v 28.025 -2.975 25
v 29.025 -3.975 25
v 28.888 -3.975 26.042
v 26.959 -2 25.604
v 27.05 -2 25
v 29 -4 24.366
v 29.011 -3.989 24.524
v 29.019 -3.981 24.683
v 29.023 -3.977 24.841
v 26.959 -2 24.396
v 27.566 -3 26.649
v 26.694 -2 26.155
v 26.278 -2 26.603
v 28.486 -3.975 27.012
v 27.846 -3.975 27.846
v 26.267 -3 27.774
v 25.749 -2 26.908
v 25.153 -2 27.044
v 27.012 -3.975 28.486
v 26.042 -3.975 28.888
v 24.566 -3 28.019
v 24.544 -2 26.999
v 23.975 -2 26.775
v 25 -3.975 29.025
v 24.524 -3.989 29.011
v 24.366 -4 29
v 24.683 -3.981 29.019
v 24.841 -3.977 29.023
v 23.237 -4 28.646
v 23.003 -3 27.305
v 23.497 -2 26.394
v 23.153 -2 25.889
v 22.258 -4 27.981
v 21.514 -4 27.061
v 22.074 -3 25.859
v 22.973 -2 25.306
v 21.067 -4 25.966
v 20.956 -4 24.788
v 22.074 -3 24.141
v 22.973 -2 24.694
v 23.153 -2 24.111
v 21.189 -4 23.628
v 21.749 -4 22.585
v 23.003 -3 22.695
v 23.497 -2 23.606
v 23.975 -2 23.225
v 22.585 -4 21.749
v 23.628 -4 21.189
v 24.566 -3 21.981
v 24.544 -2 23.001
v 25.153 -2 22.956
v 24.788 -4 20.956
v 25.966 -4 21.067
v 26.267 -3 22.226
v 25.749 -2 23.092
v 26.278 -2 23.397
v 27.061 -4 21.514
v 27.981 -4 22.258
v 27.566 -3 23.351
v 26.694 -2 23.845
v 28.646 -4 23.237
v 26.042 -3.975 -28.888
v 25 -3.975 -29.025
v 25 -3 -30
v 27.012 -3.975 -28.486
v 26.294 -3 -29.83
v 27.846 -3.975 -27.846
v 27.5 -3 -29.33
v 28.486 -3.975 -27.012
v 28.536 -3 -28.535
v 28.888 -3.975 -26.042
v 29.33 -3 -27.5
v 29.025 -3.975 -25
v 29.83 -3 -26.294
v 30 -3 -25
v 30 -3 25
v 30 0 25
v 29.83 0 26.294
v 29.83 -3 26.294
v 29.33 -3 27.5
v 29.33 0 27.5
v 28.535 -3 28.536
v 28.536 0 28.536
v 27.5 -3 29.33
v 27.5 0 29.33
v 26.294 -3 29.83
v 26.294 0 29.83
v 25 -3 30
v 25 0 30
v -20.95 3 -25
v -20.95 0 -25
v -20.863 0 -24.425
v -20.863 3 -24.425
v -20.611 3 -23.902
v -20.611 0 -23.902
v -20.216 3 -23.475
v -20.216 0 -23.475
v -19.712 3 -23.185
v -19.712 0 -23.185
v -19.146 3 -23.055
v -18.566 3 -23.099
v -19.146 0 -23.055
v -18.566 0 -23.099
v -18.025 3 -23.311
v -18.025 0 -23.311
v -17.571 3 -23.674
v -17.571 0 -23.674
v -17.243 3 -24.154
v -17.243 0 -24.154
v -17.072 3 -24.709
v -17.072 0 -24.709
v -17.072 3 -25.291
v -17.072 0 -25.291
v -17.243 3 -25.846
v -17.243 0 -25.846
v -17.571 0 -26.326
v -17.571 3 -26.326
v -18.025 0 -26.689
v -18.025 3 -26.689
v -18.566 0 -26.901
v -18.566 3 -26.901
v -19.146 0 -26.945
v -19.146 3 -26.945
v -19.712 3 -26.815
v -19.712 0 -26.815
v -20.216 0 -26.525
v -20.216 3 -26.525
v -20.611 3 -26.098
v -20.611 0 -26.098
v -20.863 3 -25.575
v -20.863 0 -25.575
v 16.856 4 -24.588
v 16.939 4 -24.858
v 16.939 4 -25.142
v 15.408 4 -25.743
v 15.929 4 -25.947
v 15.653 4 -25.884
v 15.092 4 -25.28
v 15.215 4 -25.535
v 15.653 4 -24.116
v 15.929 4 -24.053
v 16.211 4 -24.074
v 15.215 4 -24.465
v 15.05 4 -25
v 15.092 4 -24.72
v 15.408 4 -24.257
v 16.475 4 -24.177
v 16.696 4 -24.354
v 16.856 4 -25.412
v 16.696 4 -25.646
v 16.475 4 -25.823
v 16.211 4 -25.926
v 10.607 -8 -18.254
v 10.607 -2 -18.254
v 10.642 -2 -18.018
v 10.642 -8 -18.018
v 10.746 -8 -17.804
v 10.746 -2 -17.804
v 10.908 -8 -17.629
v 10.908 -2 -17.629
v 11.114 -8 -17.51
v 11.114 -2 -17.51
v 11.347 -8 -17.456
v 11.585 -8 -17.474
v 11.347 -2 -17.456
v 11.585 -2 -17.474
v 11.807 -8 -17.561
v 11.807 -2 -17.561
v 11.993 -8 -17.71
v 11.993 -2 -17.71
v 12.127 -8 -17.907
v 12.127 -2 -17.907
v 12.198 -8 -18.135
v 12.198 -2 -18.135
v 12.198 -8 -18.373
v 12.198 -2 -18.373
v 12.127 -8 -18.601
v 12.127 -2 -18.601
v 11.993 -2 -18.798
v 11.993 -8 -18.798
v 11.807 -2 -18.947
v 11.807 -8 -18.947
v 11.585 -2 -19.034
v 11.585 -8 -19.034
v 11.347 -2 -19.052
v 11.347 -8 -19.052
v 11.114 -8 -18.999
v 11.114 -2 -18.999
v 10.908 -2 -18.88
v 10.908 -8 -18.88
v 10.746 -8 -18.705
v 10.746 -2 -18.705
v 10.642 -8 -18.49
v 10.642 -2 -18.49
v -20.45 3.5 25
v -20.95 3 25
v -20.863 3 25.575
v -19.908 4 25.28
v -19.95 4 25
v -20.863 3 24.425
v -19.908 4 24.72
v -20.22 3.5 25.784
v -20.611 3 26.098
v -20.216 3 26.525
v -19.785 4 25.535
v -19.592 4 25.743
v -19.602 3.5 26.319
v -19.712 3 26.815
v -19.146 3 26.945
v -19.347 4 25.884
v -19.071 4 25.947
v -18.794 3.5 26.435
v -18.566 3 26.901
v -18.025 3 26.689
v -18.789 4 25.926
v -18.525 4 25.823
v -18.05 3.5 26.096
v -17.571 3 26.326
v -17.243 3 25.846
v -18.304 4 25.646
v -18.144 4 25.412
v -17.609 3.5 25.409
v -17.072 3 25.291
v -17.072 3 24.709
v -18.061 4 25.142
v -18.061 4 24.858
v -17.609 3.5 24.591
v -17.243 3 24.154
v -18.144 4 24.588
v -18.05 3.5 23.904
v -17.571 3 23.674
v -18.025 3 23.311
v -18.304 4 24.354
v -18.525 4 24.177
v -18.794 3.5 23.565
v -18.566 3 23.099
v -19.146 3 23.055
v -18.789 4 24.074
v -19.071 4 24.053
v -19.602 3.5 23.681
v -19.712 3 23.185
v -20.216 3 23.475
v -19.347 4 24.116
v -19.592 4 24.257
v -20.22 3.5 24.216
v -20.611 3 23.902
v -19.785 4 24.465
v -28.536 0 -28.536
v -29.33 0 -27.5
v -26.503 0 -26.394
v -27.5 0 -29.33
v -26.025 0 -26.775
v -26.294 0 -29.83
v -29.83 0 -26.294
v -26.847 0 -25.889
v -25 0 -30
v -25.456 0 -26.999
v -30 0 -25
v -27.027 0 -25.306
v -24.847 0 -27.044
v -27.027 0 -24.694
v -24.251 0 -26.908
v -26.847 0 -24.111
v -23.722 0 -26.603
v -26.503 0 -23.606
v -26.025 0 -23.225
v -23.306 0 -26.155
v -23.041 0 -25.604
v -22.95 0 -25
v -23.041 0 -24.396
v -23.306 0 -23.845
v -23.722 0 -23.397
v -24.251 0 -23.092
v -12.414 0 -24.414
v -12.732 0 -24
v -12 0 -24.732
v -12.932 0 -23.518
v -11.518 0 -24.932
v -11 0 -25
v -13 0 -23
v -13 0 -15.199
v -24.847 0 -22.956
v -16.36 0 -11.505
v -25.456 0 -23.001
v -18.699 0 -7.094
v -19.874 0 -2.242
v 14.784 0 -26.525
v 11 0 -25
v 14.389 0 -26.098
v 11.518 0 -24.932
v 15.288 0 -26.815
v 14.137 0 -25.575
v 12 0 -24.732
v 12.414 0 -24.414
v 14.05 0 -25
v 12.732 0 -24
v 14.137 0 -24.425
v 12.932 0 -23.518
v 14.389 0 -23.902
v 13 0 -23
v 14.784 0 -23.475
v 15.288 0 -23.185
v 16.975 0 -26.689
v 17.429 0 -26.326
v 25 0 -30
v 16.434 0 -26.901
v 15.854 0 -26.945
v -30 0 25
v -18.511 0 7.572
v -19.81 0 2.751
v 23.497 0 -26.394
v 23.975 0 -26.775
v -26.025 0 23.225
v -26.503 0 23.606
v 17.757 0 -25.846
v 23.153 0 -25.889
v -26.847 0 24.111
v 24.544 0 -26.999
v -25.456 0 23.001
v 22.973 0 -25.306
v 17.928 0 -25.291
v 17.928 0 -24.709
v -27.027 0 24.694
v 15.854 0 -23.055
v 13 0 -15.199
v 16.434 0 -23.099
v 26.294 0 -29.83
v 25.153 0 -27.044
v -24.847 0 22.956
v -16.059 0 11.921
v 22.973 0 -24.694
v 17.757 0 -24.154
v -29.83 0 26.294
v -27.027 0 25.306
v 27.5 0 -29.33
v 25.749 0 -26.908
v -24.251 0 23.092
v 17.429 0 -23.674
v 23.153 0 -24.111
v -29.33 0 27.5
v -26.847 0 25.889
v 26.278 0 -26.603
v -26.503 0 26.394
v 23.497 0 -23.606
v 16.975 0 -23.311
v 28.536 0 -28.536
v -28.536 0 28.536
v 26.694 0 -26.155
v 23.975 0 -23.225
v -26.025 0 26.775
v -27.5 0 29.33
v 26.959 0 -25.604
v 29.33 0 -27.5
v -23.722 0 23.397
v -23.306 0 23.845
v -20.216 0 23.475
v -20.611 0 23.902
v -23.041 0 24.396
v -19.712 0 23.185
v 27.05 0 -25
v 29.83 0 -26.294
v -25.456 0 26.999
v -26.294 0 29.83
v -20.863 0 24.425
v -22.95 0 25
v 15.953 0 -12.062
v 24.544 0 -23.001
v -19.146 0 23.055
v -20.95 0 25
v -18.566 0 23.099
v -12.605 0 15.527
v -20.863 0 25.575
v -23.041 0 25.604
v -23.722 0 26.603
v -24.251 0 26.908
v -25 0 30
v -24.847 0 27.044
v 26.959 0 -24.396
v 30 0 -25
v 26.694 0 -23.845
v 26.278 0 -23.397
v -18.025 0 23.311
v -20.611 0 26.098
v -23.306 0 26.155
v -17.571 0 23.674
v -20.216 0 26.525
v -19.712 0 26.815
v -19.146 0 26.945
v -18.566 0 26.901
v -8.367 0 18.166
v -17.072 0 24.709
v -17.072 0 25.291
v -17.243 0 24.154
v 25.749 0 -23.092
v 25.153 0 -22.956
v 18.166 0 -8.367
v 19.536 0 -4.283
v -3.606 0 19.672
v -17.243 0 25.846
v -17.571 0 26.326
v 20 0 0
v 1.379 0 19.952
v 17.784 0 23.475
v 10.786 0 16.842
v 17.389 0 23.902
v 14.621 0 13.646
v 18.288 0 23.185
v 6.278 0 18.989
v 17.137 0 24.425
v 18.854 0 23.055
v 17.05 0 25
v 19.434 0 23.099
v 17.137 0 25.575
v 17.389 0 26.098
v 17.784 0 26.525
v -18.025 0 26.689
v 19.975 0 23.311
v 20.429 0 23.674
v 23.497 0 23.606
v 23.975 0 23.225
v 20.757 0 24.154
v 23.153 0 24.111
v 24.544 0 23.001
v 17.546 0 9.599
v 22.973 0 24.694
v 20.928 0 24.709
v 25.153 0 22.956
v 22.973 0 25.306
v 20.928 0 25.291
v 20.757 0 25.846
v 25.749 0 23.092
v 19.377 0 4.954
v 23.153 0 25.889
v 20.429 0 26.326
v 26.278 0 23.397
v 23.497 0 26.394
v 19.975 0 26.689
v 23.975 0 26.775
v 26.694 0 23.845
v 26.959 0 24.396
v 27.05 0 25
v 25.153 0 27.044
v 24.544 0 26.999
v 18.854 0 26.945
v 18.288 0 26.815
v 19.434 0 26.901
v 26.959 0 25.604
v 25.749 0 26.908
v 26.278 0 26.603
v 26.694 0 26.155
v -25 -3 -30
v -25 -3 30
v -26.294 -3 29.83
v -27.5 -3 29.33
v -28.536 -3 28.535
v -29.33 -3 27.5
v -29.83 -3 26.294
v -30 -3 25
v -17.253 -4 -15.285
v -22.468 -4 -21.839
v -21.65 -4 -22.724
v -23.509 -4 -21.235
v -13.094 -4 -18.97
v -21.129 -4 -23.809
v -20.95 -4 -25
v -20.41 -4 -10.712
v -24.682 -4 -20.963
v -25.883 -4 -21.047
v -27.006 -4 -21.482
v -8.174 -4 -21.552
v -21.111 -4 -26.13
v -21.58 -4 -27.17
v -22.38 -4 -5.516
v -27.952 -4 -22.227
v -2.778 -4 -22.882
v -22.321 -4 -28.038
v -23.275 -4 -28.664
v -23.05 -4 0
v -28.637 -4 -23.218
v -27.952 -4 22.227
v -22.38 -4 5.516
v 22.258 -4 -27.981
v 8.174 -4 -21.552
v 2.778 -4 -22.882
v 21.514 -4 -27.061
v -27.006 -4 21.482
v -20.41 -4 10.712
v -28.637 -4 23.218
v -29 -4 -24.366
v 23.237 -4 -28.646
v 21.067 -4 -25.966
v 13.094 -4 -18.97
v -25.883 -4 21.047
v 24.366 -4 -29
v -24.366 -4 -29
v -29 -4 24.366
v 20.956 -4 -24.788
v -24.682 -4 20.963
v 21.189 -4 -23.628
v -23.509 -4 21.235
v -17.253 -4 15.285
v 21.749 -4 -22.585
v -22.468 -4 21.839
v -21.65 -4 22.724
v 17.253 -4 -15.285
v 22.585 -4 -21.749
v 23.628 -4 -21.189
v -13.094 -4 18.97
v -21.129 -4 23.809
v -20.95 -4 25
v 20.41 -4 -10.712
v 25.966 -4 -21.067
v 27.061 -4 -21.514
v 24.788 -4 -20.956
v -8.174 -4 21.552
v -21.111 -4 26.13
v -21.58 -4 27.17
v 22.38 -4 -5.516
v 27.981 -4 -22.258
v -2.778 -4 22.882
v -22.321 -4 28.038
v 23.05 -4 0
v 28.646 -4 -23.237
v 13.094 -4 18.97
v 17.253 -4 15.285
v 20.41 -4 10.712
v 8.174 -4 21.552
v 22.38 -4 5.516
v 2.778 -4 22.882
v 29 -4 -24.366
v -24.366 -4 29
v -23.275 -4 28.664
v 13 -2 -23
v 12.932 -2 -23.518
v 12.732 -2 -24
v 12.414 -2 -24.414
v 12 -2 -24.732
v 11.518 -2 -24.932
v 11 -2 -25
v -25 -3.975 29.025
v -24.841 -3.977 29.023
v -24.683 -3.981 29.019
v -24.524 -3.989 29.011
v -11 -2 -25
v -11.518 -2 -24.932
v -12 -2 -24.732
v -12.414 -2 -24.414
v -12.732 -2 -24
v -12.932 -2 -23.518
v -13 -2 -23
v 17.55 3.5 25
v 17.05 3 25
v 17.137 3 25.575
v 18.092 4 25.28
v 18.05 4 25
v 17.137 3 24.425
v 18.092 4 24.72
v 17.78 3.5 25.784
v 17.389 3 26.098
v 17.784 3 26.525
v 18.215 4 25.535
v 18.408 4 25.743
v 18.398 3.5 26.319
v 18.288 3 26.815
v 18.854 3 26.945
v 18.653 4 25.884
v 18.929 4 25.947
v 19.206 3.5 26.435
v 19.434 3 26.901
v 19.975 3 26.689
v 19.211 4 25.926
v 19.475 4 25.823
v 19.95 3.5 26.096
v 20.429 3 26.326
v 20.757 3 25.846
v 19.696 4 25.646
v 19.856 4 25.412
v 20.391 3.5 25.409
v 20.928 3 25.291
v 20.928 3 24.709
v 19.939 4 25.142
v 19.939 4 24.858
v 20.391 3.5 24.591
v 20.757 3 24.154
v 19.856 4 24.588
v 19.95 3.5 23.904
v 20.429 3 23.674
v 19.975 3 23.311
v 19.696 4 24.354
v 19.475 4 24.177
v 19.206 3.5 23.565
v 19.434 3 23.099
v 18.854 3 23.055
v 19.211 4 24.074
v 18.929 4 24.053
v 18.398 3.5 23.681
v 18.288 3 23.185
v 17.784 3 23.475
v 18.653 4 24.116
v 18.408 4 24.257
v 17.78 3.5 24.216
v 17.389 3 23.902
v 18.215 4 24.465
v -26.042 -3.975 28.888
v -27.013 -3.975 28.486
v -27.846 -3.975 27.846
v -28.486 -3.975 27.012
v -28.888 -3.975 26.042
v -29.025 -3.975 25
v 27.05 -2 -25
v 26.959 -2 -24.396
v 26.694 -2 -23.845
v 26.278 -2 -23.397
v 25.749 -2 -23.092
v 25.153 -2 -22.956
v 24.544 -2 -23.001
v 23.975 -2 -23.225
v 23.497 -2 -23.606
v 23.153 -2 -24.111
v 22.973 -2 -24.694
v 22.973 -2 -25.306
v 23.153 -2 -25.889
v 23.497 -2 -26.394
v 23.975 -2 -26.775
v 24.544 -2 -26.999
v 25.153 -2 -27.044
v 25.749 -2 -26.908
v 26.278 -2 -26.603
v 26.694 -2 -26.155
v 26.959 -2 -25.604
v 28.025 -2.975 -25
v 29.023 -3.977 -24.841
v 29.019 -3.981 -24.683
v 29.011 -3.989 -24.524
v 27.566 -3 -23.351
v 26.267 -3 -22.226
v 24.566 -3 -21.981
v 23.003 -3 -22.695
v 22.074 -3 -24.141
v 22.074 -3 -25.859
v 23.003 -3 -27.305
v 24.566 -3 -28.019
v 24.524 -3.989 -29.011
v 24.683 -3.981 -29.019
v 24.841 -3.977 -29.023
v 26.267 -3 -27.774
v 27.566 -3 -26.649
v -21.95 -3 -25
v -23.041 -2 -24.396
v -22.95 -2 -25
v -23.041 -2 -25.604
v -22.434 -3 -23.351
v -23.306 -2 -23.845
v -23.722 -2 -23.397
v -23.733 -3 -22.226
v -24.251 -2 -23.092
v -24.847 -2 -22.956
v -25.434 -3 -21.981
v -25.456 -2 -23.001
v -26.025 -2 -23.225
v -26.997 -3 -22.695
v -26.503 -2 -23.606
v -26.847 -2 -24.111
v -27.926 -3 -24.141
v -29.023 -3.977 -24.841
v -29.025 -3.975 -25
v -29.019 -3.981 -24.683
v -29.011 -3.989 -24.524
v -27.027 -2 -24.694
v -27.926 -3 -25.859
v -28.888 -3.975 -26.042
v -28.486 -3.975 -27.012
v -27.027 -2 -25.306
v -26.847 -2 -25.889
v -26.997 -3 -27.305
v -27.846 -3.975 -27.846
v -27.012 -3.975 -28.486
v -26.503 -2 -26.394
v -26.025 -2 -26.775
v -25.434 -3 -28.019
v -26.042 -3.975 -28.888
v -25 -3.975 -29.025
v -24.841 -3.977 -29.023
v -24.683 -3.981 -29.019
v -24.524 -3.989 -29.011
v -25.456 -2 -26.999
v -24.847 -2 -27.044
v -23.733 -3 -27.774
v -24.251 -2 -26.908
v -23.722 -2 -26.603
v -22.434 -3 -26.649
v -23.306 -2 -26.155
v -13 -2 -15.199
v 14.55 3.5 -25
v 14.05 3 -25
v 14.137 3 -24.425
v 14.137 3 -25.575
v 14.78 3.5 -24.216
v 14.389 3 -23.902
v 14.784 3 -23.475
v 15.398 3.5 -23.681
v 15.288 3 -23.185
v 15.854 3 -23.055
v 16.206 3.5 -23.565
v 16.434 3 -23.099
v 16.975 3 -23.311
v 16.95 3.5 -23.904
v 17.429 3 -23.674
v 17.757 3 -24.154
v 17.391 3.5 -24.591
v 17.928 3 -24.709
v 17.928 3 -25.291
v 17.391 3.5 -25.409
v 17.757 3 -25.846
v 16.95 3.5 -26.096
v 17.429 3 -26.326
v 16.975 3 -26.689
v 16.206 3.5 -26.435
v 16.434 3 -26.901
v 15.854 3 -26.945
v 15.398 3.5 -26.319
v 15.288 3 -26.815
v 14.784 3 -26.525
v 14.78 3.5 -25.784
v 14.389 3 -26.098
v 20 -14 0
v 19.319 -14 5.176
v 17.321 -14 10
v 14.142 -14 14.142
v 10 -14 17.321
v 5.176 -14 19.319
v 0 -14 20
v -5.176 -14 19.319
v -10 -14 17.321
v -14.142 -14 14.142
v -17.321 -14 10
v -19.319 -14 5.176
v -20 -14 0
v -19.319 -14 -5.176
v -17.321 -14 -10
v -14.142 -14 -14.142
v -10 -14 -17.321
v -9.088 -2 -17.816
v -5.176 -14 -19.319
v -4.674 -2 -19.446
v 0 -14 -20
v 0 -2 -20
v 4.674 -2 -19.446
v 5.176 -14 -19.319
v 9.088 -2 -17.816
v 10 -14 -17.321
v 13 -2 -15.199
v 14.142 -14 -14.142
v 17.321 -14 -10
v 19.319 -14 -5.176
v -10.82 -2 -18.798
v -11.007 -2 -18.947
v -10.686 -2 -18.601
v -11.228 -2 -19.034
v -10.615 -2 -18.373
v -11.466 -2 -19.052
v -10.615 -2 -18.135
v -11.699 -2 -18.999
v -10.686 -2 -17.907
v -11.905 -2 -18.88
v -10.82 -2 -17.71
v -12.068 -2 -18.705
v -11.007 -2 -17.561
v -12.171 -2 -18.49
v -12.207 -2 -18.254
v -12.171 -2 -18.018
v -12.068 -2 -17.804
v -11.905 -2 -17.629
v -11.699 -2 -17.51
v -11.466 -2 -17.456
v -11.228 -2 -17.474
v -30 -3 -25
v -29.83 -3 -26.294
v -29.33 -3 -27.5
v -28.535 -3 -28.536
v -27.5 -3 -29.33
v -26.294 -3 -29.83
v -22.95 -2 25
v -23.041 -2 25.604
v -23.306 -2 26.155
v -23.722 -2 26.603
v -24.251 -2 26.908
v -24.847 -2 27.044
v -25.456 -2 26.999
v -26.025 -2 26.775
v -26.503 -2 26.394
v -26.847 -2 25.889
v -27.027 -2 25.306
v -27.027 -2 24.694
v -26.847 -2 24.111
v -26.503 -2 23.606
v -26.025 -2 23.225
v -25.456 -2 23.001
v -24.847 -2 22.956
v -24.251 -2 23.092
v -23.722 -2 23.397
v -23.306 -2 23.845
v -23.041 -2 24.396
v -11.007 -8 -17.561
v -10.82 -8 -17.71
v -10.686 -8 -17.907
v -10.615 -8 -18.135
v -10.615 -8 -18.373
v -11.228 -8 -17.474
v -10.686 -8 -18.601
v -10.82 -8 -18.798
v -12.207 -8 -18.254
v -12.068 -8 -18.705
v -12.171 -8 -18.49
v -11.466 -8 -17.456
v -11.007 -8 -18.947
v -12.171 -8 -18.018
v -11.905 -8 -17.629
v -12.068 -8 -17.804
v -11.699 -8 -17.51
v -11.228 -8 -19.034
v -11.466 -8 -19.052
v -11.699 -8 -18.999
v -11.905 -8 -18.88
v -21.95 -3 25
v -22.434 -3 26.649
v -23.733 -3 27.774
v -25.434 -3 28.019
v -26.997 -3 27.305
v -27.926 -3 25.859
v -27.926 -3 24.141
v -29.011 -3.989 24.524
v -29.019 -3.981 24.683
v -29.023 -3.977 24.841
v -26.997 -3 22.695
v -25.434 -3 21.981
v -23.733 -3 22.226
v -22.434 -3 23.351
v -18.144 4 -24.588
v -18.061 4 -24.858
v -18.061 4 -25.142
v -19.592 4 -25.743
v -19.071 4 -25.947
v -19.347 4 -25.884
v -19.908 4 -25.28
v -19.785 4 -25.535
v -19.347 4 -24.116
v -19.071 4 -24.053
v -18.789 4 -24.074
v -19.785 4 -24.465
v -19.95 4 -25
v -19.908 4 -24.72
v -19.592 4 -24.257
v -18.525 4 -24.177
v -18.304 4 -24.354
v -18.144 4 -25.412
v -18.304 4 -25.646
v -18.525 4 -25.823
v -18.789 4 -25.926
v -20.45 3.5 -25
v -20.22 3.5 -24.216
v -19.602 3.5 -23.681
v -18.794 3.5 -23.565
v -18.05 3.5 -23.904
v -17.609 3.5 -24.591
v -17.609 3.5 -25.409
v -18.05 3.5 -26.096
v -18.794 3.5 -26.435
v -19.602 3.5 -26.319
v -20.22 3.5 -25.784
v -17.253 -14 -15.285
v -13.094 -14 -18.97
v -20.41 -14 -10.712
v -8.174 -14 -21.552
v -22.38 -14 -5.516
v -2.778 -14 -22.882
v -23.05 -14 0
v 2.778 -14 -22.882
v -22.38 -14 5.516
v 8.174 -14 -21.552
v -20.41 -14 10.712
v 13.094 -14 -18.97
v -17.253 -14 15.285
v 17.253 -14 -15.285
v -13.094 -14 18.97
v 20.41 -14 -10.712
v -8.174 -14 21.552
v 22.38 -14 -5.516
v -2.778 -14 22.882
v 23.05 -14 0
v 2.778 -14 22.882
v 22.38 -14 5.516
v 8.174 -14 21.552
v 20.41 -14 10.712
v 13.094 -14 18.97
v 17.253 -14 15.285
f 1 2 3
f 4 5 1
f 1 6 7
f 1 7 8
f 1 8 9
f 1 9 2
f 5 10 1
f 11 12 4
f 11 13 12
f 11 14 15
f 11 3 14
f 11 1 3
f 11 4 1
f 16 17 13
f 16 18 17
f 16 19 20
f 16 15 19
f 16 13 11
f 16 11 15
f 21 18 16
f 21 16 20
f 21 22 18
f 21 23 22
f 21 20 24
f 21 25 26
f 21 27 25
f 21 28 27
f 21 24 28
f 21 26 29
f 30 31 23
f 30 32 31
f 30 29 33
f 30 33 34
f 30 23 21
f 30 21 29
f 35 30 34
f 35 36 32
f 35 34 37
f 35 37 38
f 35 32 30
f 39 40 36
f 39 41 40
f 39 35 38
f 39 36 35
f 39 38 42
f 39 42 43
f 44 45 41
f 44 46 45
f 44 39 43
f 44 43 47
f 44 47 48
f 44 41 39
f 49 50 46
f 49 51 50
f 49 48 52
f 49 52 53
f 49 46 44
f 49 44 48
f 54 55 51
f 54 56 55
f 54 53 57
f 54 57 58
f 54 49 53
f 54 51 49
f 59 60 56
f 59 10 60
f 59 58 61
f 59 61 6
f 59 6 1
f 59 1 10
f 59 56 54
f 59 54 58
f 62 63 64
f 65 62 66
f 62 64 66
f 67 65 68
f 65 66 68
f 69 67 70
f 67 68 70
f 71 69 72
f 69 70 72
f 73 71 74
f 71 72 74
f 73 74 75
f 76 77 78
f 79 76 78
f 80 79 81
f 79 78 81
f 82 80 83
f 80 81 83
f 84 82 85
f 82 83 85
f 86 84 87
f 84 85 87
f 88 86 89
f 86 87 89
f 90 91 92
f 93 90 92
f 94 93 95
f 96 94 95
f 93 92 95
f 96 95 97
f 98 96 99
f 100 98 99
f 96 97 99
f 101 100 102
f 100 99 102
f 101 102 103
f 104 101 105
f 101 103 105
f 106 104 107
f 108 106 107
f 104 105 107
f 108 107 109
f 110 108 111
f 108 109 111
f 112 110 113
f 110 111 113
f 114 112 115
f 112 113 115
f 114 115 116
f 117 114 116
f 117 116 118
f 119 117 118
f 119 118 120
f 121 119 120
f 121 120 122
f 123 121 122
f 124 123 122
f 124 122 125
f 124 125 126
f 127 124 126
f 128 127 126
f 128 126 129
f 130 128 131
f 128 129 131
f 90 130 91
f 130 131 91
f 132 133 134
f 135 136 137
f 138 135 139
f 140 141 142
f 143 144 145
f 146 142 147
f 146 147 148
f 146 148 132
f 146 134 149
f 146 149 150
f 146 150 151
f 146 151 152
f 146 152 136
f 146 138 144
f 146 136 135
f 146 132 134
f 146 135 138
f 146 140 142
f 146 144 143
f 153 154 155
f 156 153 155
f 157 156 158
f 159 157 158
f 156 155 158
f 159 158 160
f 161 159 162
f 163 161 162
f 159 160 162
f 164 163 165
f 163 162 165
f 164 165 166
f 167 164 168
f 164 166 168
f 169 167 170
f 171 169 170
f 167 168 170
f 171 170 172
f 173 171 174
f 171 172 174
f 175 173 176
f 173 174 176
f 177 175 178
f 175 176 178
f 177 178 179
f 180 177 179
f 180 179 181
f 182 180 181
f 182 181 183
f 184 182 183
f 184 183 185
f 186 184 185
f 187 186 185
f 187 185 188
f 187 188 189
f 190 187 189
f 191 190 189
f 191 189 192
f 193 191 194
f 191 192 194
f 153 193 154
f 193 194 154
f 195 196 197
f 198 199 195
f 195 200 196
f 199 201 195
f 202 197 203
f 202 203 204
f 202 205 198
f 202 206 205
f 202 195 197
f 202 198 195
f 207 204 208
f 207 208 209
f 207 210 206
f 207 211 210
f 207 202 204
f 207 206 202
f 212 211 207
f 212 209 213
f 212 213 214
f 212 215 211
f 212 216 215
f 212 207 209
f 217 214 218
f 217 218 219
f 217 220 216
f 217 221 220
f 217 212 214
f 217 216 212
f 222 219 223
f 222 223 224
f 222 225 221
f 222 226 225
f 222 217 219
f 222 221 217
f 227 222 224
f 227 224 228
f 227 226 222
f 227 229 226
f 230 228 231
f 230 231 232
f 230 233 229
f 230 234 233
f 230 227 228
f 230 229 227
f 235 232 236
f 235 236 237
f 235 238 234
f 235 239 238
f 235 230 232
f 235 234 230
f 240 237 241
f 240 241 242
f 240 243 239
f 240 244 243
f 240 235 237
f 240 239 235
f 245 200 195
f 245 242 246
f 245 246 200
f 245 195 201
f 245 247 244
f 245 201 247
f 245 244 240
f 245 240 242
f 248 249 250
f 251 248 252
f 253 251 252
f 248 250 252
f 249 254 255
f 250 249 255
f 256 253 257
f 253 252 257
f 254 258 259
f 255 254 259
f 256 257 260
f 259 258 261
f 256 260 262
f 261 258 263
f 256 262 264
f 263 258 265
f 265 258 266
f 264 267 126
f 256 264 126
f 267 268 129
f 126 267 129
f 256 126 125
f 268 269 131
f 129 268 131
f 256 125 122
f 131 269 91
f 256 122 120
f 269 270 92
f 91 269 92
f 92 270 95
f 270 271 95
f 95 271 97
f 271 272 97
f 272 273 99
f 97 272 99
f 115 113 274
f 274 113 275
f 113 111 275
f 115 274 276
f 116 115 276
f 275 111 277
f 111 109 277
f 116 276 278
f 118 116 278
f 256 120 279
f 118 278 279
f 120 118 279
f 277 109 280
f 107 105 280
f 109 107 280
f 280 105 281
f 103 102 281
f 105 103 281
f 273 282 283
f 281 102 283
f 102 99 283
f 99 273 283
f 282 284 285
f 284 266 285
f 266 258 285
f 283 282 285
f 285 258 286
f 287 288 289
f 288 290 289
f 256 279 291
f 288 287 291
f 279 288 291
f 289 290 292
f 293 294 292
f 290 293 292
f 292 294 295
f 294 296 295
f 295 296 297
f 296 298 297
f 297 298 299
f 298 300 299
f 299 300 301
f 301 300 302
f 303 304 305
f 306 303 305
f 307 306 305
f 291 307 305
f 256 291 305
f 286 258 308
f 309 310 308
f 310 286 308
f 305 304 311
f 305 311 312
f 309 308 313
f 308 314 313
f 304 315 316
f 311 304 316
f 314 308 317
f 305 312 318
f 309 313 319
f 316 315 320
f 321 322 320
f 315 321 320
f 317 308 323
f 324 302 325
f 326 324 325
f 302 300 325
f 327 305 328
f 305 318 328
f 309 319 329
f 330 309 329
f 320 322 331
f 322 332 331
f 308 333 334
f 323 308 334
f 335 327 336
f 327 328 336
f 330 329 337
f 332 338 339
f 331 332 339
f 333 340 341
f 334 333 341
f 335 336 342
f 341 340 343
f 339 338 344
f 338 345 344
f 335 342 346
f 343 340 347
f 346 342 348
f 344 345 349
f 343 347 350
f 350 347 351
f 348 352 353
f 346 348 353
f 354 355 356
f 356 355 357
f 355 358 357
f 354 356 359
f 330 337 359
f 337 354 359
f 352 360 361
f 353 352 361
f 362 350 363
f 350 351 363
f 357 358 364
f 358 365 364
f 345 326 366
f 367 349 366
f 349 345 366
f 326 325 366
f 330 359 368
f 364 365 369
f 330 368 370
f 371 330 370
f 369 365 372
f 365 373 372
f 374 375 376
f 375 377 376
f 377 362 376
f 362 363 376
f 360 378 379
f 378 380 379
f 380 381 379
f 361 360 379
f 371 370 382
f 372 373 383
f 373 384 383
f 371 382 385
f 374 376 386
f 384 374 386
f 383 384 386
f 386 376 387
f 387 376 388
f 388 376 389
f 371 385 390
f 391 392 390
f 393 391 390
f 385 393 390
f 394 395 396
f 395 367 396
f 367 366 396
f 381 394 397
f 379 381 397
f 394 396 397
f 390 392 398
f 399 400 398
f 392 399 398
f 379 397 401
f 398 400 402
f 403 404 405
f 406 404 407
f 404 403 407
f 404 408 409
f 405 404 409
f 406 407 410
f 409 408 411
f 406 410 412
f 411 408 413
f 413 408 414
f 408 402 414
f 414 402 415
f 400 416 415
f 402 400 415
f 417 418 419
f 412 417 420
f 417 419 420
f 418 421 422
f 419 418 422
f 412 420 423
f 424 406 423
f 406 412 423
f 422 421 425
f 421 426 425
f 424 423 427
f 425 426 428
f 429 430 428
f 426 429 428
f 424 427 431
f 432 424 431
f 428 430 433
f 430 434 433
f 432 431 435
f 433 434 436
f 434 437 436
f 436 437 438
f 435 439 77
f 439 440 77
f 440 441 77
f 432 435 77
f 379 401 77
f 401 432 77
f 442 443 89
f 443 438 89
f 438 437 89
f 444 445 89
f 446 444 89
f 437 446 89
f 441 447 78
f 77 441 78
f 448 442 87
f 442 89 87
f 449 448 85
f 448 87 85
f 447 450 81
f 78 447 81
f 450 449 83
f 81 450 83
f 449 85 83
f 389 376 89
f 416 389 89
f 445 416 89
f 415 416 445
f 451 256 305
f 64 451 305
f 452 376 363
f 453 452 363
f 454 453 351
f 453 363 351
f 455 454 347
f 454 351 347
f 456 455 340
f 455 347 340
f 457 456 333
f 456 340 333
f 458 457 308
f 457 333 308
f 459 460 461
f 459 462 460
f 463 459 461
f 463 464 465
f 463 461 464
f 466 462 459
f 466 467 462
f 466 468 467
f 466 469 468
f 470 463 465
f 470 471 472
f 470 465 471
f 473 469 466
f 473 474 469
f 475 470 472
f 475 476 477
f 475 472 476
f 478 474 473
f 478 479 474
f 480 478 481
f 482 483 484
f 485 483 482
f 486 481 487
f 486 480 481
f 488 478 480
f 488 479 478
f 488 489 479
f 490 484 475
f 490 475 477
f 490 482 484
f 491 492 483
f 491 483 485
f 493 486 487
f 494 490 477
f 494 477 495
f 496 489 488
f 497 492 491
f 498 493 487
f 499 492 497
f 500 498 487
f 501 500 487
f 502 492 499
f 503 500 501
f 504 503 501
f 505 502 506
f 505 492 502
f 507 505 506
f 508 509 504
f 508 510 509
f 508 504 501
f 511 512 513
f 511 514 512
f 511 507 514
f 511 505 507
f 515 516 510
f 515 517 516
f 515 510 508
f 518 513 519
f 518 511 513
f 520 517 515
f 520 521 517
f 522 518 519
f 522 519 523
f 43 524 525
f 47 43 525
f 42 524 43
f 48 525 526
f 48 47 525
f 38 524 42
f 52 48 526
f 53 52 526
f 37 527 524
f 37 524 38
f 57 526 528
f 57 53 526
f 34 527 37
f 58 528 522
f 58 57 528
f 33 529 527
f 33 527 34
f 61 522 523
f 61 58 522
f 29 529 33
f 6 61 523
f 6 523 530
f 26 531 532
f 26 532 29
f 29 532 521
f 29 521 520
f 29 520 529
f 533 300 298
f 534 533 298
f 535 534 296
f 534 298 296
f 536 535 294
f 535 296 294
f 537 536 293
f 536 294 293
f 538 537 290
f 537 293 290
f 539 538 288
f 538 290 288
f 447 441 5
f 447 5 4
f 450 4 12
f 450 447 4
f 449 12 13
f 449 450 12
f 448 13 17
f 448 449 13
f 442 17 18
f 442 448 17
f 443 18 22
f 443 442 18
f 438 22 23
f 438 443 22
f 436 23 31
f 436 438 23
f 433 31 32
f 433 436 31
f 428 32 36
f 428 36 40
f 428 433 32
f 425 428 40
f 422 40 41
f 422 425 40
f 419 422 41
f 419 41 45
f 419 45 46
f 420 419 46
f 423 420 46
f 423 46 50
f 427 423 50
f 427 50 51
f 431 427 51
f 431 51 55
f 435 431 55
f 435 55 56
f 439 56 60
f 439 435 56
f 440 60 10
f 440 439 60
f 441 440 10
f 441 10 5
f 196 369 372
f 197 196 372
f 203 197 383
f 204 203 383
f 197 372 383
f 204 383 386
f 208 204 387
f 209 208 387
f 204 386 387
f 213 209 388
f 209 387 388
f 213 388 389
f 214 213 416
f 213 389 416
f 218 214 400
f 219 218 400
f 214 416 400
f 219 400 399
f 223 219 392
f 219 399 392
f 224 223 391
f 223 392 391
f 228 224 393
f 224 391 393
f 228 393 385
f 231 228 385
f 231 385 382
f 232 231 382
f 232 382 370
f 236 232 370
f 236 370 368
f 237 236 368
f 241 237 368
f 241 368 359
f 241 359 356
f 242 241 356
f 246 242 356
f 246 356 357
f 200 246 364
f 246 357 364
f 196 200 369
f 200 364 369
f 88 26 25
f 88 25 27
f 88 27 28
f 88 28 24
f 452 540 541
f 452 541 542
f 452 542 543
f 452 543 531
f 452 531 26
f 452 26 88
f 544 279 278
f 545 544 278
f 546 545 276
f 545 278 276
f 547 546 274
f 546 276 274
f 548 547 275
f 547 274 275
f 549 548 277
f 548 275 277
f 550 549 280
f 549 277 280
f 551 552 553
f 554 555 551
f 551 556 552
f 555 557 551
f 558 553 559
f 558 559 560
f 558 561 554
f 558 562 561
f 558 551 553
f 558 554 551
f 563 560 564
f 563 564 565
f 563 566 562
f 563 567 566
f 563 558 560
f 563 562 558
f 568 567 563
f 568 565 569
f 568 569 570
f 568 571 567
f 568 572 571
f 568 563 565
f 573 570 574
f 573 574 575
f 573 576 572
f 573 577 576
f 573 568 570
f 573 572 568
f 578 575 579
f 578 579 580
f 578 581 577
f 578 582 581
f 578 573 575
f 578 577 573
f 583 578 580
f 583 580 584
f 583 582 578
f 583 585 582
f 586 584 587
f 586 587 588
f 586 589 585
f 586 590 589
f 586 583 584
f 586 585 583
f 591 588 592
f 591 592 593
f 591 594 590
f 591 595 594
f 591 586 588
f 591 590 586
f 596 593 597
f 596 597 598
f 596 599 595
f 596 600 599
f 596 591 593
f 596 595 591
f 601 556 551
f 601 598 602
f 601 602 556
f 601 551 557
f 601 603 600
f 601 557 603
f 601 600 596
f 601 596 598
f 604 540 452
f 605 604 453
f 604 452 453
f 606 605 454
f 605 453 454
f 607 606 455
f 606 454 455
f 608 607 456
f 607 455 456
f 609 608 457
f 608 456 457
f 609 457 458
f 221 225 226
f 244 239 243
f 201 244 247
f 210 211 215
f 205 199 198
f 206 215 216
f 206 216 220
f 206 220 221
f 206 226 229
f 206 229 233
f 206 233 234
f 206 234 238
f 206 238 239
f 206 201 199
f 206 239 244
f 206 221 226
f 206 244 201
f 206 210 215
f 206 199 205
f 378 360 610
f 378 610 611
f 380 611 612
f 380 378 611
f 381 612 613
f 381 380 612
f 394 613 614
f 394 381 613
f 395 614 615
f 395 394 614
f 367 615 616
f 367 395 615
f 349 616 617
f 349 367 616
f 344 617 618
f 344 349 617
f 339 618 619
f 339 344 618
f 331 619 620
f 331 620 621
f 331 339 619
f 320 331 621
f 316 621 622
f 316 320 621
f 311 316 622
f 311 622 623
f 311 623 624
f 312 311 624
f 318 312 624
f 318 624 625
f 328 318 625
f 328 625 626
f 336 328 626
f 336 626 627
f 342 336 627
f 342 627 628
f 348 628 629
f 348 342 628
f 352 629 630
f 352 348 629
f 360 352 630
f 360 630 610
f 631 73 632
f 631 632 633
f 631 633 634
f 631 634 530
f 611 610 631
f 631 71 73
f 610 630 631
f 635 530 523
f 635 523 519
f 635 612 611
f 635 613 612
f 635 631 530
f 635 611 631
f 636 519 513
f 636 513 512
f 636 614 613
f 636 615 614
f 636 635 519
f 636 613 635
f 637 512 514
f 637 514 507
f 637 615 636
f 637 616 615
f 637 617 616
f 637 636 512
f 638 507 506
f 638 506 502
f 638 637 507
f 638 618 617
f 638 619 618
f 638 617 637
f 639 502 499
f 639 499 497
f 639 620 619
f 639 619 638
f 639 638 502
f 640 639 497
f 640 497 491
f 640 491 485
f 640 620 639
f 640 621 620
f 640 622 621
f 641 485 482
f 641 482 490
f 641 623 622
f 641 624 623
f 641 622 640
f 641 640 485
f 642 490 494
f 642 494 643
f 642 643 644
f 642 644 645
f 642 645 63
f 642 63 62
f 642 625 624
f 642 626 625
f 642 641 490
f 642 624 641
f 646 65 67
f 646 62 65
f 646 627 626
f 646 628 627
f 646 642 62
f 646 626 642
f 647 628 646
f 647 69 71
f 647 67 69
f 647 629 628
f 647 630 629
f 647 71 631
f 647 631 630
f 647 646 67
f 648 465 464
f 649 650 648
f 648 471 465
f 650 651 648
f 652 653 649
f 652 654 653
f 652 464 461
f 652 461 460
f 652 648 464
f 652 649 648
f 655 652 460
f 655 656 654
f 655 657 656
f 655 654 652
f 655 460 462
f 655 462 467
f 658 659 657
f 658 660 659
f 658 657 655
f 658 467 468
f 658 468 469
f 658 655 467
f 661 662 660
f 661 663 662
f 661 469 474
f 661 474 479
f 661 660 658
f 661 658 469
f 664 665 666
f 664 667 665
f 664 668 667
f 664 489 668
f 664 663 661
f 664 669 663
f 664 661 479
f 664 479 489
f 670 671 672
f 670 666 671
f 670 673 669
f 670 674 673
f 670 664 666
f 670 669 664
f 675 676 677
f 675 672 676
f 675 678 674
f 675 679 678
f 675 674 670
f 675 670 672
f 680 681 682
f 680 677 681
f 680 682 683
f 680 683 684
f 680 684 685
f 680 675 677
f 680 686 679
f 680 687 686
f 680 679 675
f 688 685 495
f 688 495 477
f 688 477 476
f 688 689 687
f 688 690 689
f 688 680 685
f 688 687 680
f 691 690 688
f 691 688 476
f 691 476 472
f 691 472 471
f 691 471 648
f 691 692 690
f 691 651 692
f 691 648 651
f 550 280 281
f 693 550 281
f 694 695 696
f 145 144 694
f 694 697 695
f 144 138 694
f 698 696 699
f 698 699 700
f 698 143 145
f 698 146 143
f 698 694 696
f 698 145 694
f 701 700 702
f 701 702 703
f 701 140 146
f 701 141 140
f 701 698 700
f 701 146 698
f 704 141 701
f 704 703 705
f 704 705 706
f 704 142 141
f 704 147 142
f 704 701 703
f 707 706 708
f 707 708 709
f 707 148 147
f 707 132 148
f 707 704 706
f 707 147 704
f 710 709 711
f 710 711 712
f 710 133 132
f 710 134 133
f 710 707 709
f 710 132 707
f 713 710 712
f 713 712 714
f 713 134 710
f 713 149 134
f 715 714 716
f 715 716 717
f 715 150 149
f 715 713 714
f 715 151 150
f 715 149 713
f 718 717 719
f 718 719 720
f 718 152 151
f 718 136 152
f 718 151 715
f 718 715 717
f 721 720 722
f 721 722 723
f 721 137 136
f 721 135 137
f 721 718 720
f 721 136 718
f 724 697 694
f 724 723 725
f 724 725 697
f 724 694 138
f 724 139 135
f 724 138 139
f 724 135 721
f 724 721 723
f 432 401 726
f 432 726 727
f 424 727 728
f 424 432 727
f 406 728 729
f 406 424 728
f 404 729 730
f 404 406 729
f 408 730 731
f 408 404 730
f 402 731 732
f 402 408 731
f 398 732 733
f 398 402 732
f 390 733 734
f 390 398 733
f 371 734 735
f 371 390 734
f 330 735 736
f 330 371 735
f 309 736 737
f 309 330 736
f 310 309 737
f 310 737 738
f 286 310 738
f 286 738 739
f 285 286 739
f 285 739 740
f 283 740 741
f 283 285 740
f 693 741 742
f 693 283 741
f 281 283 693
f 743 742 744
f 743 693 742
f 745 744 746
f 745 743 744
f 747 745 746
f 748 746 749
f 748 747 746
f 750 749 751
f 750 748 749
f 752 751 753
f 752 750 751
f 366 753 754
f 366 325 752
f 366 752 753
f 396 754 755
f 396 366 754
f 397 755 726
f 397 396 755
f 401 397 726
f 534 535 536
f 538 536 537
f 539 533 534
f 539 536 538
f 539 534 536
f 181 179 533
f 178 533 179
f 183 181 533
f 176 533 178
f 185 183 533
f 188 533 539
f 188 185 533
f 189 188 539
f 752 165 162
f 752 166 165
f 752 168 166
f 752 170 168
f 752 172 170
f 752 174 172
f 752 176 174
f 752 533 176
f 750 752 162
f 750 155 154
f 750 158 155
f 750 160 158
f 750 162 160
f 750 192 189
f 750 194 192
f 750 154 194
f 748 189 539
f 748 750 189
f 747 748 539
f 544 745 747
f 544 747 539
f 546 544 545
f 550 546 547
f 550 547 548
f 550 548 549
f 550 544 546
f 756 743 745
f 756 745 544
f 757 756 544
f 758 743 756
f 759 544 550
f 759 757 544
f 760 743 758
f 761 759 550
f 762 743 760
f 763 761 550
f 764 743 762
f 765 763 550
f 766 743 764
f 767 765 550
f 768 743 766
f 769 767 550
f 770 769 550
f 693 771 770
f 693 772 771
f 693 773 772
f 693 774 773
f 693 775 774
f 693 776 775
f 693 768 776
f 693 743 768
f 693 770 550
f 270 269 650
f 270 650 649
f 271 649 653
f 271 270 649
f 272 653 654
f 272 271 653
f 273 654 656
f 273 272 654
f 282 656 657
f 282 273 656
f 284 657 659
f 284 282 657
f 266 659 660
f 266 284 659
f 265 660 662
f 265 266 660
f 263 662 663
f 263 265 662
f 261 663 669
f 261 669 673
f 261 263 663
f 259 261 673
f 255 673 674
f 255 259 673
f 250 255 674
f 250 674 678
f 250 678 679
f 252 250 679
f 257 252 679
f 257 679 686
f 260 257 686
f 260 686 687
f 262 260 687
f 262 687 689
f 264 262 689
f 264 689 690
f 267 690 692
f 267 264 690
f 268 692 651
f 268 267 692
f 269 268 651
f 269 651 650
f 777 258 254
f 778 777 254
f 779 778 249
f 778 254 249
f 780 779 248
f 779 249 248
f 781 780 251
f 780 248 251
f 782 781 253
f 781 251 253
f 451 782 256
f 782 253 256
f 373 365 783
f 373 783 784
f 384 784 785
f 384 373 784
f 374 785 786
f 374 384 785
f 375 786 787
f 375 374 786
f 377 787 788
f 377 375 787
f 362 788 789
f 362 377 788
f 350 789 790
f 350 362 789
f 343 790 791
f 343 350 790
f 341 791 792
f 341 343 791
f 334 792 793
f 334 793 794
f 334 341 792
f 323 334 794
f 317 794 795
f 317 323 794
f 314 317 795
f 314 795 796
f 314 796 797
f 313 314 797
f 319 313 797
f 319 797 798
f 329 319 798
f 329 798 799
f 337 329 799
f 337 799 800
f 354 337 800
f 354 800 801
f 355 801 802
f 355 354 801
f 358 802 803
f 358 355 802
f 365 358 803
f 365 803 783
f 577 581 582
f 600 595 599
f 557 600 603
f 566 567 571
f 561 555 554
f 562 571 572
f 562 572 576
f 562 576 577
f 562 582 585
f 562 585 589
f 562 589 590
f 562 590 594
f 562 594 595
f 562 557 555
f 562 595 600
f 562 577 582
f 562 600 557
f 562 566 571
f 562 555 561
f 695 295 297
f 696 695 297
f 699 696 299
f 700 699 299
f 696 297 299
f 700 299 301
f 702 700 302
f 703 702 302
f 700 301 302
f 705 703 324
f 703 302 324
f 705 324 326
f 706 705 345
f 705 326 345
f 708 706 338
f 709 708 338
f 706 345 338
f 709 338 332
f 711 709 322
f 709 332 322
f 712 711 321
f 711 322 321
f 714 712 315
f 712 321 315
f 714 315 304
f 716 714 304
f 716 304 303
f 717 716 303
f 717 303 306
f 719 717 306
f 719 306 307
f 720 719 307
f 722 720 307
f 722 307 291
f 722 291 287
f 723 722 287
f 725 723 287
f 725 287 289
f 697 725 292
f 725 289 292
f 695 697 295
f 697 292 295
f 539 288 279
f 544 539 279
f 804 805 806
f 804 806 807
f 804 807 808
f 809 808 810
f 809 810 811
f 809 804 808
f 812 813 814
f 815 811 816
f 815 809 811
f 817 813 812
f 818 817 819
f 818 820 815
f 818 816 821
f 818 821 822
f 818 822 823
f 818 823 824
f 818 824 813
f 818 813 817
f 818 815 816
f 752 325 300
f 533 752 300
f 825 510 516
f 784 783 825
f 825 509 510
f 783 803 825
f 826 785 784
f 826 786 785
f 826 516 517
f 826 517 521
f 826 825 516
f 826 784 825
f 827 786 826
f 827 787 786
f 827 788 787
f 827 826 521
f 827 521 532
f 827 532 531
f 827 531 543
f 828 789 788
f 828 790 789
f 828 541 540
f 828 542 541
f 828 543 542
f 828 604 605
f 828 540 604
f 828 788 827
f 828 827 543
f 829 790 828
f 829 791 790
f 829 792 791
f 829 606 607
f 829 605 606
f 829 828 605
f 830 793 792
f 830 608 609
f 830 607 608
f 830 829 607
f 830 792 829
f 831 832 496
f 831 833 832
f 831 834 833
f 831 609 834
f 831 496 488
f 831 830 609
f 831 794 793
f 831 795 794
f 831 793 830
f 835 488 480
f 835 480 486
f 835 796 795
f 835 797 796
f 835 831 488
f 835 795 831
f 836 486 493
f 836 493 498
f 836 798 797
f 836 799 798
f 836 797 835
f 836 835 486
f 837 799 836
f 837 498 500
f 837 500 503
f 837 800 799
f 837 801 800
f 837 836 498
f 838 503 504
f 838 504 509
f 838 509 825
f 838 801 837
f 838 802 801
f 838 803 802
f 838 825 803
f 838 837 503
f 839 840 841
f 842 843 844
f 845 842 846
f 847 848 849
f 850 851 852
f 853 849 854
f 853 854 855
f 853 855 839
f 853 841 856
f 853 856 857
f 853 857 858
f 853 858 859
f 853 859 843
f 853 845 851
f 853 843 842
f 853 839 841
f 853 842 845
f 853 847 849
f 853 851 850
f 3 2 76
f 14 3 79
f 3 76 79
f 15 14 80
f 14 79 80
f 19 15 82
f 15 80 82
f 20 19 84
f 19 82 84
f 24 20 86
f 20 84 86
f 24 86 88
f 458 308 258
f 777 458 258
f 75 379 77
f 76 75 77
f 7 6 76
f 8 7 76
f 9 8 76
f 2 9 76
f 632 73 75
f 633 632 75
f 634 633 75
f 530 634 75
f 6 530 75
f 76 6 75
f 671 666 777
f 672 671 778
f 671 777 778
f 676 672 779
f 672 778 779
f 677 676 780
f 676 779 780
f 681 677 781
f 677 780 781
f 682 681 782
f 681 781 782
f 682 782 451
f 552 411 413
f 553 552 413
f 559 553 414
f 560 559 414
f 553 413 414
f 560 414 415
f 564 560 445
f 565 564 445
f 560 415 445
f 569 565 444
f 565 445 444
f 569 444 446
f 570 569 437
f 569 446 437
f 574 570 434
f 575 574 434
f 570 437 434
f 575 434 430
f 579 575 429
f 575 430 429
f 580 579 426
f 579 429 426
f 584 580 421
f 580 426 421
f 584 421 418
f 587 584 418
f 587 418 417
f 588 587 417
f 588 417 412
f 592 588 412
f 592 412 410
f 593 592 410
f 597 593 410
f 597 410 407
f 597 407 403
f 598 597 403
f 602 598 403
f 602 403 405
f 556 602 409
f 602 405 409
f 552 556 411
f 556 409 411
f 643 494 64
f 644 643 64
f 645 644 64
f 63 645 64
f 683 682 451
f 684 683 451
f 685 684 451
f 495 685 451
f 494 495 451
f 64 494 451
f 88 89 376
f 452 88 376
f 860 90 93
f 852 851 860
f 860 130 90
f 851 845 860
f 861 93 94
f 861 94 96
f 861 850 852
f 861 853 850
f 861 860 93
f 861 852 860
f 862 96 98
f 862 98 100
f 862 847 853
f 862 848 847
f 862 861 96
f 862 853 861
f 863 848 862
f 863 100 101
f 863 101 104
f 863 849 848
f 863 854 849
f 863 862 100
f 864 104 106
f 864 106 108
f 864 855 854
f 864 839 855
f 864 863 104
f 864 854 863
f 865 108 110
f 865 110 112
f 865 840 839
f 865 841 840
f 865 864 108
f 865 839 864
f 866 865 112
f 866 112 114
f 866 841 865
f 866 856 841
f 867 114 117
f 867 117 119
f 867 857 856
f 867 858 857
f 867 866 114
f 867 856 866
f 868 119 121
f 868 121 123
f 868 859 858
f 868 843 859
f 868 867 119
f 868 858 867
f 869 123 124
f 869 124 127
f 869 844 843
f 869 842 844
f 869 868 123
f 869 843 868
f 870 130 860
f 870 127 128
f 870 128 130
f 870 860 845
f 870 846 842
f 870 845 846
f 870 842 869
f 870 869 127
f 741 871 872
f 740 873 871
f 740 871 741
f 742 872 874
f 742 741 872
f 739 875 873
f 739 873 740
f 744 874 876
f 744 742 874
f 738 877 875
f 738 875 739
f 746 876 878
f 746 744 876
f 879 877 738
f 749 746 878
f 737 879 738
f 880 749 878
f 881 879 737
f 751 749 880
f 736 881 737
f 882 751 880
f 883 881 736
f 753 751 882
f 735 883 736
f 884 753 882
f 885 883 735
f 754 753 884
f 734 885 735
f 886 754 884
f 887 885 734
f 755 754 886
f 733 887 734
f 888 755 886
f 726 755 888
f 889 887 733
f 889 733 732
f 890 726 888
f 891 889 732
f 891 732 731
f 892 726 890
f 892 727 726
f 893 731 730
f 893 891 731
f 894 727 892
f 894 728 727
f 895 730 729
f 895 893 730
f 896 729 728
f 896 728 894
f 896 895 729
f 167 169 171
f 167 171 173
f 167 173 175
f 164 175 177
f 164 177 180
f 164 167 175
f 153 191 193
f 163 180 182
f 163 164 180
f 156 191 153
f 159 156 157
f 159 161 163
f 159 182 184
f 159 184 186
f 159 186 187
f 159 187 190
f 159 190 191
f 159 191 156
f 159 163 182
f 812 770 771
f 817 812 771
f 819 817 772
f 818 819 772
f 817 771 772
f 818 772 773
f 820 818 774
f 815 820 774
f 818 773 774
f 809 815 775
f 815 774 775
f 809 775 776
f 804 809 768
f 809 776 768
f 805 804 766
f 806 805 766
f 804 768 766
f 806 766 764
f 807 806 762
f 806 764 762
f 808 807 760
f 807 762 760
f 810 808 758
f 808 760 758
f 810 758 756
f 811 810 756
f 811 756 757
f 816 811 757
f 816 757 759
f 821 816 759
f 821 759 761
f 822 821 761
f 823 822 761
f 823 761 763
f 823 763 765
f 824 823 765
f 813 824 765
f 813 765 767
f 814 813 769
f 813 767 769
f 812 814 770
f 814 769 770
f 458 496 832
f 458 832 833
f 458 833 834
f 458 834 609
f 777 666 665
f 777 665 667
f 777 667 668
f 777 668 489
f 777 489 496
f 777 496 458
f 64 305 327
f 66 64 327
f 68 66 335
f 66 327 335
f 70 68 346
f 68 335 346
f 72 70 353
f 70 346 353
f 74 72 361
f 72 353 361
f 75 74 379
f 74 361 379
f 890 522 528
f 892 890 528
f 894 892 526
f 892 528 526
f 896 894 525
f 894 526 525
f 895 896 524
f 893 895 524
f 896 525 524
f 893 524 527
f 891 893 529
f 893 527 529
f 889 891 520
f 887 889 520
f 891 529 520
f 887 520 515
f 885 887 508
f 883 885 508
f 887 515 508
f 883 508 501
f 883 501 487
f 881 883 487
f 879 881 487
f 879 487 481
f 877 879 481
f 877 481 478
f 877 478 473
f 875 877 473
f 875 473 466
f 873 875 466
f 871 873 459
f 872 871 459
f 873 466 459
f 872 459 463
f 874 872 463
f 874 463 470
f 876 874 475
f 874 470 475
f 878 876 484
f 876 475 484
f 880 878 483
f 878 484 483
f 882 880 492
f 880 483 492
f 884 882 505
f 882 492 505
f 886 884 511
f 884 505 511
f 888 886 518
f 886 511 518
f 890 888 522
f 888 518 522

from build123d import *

# Parameters (mm, degrees)
F0_R          = 2.05
F0_R_2        = 20
F1_DEPTH      = 4
F2_R          = 1.95
F3_DEPTH      = 4
F4_SIZE       = 1
F5_R          = 23.05
F5_R_2        = 20
F6_DEPTH      = 10
F8_DEPTH      = 2
F9_R          = 0.8
F10_DEPTH     = 6
F11_SIZE      = 2
F12_T1_DEPTH  = 50
F12_T3_DEPTH  = 50
F12_T6_ANGLE  = 90
F12_T8_ANGLE  = 90
F12_T10_ANGLE = 90
F12_T12_ANGLE = 90


# Not quite as in the source:
# - a fillet or chamfer that OpenCascade refuses, or shapes differently, is made with other operations: its cross-section is extruded or revolved along the edge and cut away or added


with BuildPart() as f1:
    # F0 (on Front) → F1 (new body)
    with BuildSketch(Plane.XZ):
        with BuildLine():
            ThreePointArc((30, 25), (28.5355339059, 28.5355339059), (25, 30))
            Line((25, 30), (-25, 30))
            ThreePointArc((-25, 30), (-28.5355339059, 28.5355339059), (-30, 25))
            Line((-30, 25), (-30, -25))
            ThreePointArc((-30, -25), (-28.5355339059, -28.5355339059), (-25, -30))
            Line((-25, -30), (25, -30))
            ThreePointArc((25, -30), (28.5355339059, -28.5355339059), (30, -25))
            Line((30, -25), (30, 25))
        make_face()
        with Locations((-25, -25)):
            Circle(F0_R, mode=Mode.SUBTRACT)
        with Locations((25, -25)):
            Circle(F0_R, mode=Mode.SUBTRACT)
        Circle(F0_R_2, mode=Mode.SUBTRACT)
        with Locations((-25, 25)):
            Circle(F0_R, mode=Mode.SUBTRACT)
        with Locations((25, 25)):
            Circle(F0_R, mode=Mode.SUBTRACT)
    extrude(amount=F1_DEPTH)

    # F2 (on face) → F3 (join)
    with BuildSketch(Plane(origin=(0, 0, 0), x_dir=(-1, 0, 0), z_dir=(0, 1, 0))):
        with Locations((-19, 25)):
            Circle(F2_R)
        with Locations((19, 25)):
            Circle(F2_R)
        with Locations((19, -25)):
            Circle(F2_R)
        with Locations((-16, -25)):
            Circle(F2_R)
    extrude(amount=F3_DEPTH)

    # F4
    f4_edges = [f1.edges().sort_by_distance(p)[0] for p in [
        (17.95, 4, -25),
        (-17.05, 4, -25),
        (-17.05, 4, 25),
        (20.95, 4, 25),
    ]]
    chamfer(f4_edges, length=F4_SIZE)

    # F5 (on face) → F6 (join)
    with BuildSketch(Plane.XZ.offset(4)):
        Circle(F5_R)
        Circle(F5_R_2, mode=Mode.SUBTRACT)
    extrude(amount=F6_DEPTH)

    # F7 (on face) → F8 (cut)
    with BuildSketch(Plane(origin=(0, 0, 0), x_dir=(-1, 0, 0), z_dir=(0, 1, 0))):
        with BuildLine():
            ThreePointArc((13, -15.1986841536), (0, -20), (-13, -15.1986841536))
            Line((-13, -15.1986841536), (-13, -23))
            ThreePointArc((-13, -23), (-12.4142135624, -24.4142135624), (-11, -25))
            Line((-11, -25), (11, -25))
            ThreePointArc((11, -25), (12.4142135624, -24.4142135624), (13, -23))
            Line((13, -23), (13, -15.1986841536))
        make_face()
    extrude(amount=-F8_DEPTH, mode=Mode.SUBTRACT)

    # F9 (on face) → F10 (cut)
    with BuildSketch(Plane(origin=(0, -2, 0), x_dir=(-1, 0, 0), z_dir=(0, 1, 0))):
        with Locations((-11.4065121626, -18.2542352698)):
            Circle(F9_R)
        with Locations((11.4065121626, -18.2542352698)):
            Circle(F9_R)
    extrude(amount=-F10_DEPTH, mode=Mode.SUBTRACT)

    # F11
    f11_edges = [f1.edges().sort_by_distance(p)[0] for p in [
        (22.95, -4, 25),
        (-27.05, -4, 25),
        (-27.05, -4, -25),
        (22.95, -4, -25),
    ]]
    chamfer(f11_edges, length=F11_SIZE)

    # F12: chamfer of 1 on 8 edges, made by hand

    # F12_s2 → F12_t1 (cut)
    with BuildSketch(Plane.XY.offset(-25)):
        with BuildLine():
            Line((28.9717157288, -4.0282842712), (30.0282842712, -2.9717157288))
            Line((30.0282842712, -2.9717157288), (30.0482842712, -2.9717157288))
            ThreePointArc((30.0482842712, -2.9717157288), (30.02, -3.4858578644), (30.02, -4))
            Line((30.02, -4), (30, -4.02))
            ThreePointArc((30, -4.02), (29.4858578644, -4.02), (28.9717157288, -4.0482842712))
            Line((28.9717157288, -4.0482842712), (28.9717157288, -4.0282842712))
        make_face()
        with BuildLine():
            Line((-28.9717157288, -4.0282842712), (-30.0282842712, -2.9717157288))
            Line((-30.0282842712, -2.9717157288), (-30.0482842712, -2.9717157288))
            ThreePointArc((-30.0482842712, -2.9717157288), (-30.02, -3.4858578644), (-30.02, -4))
            Line((-30.02, -4), (-30, -4.02))
            ThreePointArc((-30, -4.02), (-29.4858578644, -4.02), (-28.9717157288, -4.0482842712))
            Line((-28.9717157288, -4.0482842712), (-28.9717157288, -4.0282842712))
        make_face()
    extrude(amount=F12_T1_DEPTH, mode=Mode.SUBTRACT)

    # F12_s4 → F12_t3 (cut)
    with BuildSketch(Plane.YZ.offset(-25)):
        with BuildLine():
            Line((-4.0282842712, 28.9717157288), (-2.9717157288, 30.0282842712))
            Line((-2.9717157288, 30.0282842712), (-2.9717157288, 30.0482842712))
            ThreePointArc((-2.9717157288, 30.0482842712), (-3.4858578644, 30.02), (-4, 30.02))
            Line((-4, 30.02), (-4.02, 30))
            ThreePointArc((-4.02, 30), (-4.02, 29.4858578644), (-4.0482842712, 28.9717157288))
            Line((-4.0482842712, 28.9717157288), (-4.0282842712, 28.9717157288))
        make_face()
        with BuildLine():
            Line((-4.0282842712, -28.9717157288), (-2.9717157288, -30.0282842712))
            Line((-2.9717157288, -30.0282842712), (-2.9717157288, -30.0482842712))
            ThreePointArc((-2.9717157288, -30.0482842712), (-3.4858578644, -30.02), (-4, -30.02))
            Line((-4, -30.02), (-4.02, -30))
            ThreePointArc((-4.02, -30), (-4.02, -29.4858578644), (-4.0482842712, -28.9717157288))
            Line((-4.0482842712, -28.9717157288), (-4.0282842712, -28.9717157288))
        make_face()
    extrude(amount=F12_T3_DEPTH, mode=Mode.SUBTRACT)

    # F12_s5 → F12_t6 (revolve, cut)
    with BuildSketch(Plane.XY.offset(25)):
        with BuildLine():
            Line((28.9717157288, -4.0282842712), (30.0282842712, -2.9717157288))
            Line((30.0282842712, -2.9717157288), (30.0482842712, -2.9717157288))
            ThreePointArc((30.0482842712, -2.9717157288), (30.02, -3.4858578644), (30.02, -4))
            Line((30.02, -4), (30, -4.02))
            ThreePointArc((30, -4.02), (29.4858578644, -4.02), (28.9717157288, -4.0482842712))
            Line((28.9717157288, -4.0482842712), (28.9717157288, -4.0282842712))
        make_face()
    revolve(axis=Axis((25, -4, 25), (0, -1, 0)), revolution_arc=F12_T6_ANGLE, mode=Mode.SUBTRACT)

    # F12_s7 → F12_t8 (revolve, cut)
    with BuildSketch(Plane.YZ.offset(-25)):
        with BuildLine():
            Line((-4.0282842712, 28.9717157288), (-2.9717157288, 30.0282842712))
            Line((-2.9717157288, 30.0282842712), (-2.9717157288, 30.0482842712))
            ThreePointArc((-2.9717157288, 30.0482842712), (-3.4858578644, 30.02), (-4, 30.02))
            Line((-4, 30.02), (-4.02, 30))
            ThreePointArc((-4.02, 30), (-4.02, 29.4858578644), (-4.0482842712, 28.9717157288))
            Line((-4.0482842712, 28.9717157288), (-4.0282842712, 28.9717157288))
        make_face()
    revolve(axis=Axis((-25, -4, 25), (0, -1, 0)), revolution_arc=F12_T8_ANGLE, mode=Mode.SUBTRACT)

    # F12_s9 → F12_t10 (revolve, cut)
    with BuildSketch(Plane.XY.offset(-25)):
        with BuildLine():
            Line((-28.9717157288, -4.0282842712), (-30.0282842712, -2.9717157288))
            Line((-30.0282842712, -2.9717157288), (-30.0482842712, -2.9717157288))
            ThreePointArc((-30.0482842712, -2.9717157288), (-30.02, -3.4858578644), (-30.02, -4))
            Line((-30.02, -4), (-30, -4.02))
            ThreePointArc((-30, -4.02), (-29.4858578644, -4.02), (-28.9717157288, -4.0482842712))
            Line((-28.9717157288, -4.0482842712), (-28.9717157288, -4.0282842712))
        make_face()
    revolve(axis=Axis((-25, -4, -25), (0, -1, 0)), revolution_arc=F12_T10_ANGLE, mode=Mode.SUBTRACT)

    # F12_s11 → F12_t12 (revolve, cut)
    with BuildSketch(Plane.YZ.offset(25)):
        with BuildLine():
            Line((-4.0282842712, -28.9717157288), (-2.9717157288, -30.0282842712))
            Line((-2.9717157288, -30.0282842712), (-2.9717157288, -30.0482842712))
            ThreePointArc((-2.9717157288, -30.0482842712), (-3.4858578644, -30.02), (-4, -30.02))
            Line((-4, -30.02), (-4.02, -30))
            ThreePointArc((-4.02, -30), (-4.02, -29.4858578644), (-4.0482842712, -28.9717157288))
            Line((-4.0482842712, -28.9717157288), (-4.0282842712, -28.9717157288))
        make_face()
    revolve(axis=Axis((25, -4, -25), (0, -1, 0)), revolution_arc=F12_T12_ANGLE, mode=Mode.SUBTRACT)


solid = f1.part
